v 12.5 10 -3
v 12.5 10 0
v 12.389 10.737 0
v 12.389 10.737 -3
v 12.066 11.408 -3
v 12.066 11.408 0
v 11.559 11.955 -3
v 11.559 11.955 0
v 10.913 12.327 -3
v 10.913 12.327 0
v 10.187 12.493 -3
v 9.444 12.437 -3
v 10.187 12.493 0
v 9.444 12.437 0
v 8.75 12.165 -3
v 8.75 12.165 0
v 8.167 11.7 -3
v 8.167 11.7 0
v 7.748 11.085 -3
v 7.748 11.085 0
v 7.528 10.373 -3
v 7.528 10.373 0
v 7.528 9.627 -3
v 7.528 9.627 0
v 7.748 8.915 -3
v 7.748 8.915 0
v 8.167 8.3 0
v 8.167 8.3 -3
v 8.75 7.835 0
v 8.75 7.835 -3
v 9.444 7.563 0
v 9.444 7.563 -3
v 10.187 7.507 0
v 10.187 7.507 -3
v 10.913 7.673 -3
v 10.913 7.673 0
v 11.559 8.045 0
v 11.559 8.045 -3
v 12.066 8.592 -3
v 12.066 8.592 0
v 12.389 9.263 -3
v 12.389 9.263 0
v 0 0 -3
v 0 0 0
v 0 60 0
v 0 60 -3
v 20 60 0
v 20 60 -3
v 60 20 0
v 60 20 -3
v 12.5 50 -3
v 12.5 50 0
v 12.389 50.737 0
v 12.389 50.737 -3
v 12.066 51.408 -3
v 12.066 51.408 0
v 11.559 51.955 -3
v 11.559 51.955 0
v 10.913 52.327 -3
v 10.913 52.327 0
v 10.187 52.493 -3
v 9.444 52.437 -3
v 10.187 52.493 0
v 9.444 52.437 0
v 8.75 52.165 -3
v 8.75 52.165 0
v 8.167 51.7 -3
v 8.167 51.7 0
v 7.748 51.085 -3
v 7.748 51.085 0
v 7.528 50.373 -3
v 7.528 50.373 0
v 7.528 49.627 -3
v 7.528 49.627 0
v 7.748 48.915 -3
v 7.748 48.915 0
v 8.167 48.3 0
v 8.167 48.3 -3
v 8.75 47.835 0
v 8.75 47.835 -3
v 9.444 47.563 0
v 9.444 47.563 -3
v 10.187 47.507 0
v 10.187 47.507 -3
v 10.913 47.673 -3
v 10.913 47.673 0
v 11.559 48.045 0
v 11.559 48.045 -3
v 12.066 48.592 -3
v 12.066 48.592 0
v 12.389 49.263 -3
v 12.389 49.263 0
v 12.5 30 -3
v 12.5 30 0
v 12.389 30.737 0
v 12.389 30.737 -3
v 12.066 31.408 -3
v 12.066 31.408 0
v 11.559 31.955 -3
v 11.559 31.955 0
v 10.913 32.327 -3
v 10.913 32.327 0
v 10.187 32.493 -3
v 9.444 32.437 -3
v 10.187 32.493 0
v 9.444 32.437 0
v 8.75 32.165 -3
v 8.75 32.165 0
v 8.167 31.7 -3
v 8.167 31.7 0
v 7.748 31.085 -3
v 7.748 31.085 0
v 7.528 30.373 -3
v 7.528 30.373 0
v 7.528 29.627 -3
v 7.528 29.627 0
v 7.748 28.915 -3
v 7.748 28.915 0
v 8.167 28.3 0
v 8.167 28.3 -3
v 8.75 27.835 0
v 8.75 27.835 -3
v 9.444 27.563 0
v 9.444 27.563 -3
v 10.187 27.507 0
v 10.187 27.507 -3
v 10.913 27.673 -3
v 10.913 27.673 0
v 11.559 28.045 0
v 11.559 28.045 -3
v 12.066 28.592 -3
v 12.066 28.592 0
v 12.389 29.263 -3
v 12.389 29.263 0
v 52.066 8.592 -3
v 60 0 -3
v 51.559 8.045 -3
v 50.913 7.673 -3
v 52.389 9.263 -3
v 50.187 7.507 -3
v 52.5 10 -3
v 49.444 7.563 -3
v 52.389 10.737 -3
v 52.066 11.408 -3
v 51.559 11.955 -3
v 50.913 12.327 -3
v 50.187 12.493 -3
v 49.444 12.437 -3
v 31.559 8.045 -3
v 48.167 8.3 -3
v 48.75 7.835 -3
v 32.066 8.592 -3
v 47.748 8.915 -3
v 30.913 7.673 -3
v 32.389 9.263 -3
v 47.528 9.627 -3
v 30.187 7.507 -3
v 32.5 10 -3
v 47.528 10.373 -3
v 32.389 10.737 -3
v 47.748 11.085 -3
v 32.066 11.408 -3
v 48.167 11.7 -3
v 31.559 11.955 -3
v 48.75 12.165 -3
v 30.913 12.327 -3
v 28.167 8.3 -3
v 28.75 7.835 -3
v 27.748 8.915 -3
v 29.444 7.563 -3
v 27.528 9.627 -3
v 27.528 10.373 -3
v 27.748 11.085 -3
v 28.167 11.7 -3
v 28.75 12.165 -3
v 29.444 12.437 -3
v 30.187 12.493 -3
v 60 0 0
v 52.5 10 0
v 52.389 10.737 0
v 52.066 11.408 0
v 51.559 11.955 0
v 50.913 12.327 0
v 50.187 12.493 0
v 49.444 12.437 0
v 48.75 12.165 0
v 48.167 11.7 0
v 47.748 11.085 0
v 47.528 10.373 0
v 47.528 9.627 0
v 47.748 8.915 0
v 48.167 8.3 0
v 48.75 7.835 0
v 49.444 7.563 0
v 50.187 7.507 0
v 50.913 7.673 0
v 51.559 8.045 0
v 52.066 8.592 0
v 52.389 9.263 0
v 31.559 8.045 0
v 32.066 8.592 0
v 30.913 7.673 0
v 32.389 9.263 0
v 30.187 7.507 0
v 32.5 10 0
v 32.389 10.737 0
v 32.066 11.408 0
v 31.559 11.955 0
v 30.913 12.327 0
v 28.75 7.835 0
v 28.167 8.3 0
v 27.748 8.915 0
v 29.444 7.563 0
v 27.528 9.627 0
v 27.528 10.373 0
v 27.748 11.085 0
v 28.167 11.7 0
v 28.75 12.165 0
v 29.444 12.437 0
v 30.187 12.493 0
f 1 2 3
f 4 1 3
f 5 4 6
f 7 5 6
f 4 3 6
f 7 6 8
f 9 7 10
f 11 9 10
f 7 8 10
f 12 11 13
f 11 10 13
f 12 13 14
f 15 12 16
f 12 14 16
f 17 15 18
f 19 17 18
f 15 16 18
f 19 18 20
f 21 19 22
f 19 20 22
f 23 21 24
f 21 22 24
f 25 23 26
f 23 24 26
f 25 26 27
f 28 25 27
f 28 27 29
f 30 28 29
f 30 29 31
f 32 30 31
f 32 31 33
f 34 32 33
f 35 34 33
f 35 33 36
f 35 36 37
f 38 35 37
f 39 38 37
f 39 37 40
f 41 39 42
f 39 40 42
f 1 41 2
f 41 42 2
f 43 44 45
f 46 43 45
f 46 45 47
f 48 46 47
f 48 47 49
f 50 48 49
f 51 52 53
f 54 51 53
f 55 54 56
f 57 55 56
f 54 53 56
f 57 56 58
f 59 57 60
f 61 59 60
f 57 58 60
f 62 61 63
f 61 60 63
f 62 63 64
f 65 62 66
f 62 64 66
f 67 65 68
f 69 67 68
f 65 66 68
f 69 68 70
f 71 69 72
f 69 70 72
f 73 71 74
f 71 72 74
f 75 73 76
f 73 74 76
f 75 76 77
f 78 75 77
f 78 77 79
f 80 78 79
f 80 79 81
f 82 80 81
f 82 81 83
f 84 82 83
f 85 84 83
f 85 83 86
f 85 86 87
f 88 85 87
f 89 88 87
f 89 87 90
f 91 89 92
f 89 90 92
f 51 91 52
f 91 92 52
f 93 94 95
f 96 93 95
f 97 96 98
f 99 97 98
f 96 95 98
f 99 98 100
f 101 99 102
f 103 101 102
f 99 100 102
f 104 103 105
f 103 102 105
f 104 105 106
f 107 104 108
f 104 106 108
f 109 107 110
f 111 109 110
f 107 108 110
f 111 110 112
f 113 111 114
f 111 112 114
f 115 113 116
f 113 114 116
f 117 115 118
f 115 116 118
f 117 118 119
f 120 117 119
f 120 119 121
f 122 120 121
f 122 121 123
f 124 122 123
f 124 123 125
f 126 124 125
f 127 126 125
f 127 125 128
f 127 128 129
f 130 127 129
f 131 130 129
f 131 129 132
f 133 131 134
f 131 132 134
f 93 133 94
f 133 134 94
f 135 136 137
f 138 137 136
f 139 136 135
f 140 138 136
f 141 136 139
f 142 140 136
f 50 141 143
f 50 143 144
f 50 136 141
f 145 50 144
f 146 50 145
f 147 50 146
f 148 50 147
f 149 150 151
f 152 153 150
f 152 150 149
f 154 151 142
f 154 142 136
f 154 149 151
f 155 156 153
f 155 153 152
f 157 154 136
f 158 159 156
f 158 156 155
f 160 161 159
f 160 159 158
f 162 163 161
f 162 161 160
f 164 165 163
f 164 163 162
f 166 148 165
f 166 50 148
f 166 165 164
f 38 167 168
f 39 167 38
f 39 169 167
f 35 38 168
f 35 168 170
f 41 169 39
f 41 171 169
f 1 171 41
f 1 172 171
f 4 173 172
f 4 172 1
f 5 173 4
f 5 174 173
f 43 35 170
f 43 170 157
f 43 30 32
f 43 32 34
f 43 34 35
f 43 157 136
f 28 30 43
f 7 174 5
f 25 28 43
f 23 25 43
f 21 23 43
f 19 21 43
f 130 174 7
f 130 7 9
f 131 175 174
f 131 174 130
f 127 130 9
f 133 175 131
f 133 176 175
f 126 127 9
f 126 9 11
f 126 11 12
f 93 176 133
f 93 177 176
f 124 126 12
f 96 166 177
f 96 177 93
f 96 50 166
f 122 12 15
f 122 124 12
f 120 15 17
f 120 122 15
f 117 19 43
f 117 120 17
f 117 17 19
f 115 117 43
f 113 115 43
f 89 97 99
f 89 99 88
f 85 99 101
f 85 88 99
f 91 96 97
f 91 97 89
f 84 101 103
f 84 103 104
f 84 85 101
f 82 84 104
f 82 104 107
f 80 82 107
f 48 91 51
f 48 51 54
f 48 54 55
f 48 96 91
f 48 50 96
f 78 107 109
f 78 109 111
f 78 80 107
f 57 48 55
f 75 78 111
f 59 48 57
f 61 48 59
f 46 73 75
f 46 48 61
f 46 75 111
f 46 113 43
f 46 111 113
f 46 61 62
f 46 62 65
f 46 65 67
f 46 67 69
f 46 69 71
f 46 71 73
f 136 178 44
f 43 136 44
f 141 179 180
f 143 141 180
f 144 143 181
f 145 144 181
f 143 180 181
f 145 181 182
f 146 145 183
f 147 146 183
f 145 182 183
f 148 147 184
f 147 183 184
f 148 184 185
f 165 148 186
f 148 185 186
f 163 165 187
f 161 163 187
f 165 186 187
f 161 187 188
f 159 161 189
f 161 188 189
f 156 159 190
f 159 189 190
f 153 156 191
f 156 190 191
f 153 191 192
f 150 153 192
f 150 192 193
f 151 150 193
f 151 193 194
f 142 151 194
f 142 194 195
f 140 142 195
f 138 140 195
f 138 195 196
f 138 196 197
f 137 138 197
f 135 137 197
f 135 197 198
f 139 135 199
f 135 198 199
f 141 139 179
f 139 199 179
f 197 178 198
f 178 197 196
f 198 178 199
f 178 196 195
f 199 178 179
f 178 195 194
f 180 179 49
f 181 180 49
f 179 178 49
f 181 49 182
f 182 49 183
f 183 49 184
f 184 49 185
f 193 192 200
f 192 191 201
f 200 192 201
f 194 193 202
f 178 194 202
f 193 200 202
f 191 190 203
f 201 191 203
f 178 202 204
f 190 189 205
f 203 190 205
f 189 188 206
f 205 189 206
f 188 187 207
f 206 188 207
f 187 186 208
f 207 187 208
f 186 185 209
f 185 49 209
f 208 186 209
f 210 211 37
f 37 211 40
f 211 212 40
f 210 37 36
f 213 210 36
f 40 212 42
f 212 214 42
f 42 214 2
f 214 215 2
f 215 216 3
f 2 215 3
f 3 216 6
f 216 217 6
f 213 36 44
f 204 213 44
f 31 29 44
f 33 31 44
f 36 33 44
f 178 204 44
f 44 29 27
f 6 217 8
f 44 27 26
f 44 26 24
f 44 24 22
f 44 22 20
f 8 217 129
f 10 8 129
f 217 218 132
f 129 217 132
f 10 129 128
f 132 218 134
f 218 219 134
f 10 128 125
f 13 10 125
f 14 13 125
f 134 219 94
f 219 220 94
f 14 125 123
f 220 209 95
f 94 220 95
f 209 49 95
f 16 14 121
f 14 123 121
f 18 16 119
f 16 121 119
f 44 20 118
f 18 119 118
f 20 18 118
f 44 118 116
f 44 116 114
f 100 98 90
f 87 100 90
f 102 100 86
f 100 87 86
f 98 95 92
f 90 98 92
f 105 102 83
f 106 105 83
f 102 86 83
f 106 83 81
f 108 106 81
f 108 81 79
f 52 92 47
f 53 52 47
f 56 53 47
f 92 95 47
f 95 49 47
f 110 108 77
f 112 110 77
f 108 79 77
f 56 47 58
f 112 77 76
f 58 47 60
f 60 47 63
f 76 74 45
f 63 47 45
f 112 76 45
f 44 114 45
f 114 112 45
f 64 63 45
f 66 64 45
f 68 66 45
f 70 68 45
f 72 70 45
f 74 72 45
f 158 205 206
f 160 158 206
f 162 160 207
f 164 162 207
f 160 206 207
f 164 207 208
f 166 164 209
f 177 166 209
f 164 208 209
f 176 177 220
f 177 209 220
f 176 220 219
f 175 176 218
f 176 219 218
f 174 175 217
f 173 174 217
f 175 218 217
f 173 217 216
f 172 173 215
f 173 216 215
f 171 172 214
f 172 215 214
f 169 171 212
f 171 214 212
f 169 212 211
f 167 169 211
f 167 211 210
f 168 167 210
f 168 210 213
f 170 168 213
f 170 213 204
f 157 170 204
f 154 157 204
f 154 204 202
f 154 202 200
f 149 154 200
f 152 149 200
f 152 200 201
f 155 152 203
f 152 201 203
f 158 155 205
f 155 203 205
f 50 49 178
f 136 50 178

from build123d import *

# Parameters (mm, degrees)
BOSS_EXTRUDE1_DEPTH = 3
SKETCH2_R           = 2.5
CUT_EXTRUDE1_DEPTH  = 3


with BuildPart() as part:
    # Sketch1 → Boss-Extrude1 (new body)
    with BuildSketch(Plane.XY):
        Polygon((0, 60), (20, 60), (60, 20), (60, 0), (0, 0), align=None)
    extrude(amount=-BOSS_EXTRUDE1_DEPTH)

    # Sketch2 → Cut-Extrude1 (cut)
    with BuildSketch(Plane.XY):
        with Locations((10, 10)):
            Circle(SKETCH2_R)
        with Locations((30, 10)):
            Circle(SKETCH2_R)
        with Locations((50, 10)):
            Circle(SKETCH2_R)
        with Locations((10, 30)):
            Circle(SKETCH2_R)
        with Locations((10, 50)):
            Circle(SKETCH2_R)
    extrude(amount=-CUT_EXTRUDE1_DEPTH, mode=Mode.SUBTRACT)


solid = part.part
